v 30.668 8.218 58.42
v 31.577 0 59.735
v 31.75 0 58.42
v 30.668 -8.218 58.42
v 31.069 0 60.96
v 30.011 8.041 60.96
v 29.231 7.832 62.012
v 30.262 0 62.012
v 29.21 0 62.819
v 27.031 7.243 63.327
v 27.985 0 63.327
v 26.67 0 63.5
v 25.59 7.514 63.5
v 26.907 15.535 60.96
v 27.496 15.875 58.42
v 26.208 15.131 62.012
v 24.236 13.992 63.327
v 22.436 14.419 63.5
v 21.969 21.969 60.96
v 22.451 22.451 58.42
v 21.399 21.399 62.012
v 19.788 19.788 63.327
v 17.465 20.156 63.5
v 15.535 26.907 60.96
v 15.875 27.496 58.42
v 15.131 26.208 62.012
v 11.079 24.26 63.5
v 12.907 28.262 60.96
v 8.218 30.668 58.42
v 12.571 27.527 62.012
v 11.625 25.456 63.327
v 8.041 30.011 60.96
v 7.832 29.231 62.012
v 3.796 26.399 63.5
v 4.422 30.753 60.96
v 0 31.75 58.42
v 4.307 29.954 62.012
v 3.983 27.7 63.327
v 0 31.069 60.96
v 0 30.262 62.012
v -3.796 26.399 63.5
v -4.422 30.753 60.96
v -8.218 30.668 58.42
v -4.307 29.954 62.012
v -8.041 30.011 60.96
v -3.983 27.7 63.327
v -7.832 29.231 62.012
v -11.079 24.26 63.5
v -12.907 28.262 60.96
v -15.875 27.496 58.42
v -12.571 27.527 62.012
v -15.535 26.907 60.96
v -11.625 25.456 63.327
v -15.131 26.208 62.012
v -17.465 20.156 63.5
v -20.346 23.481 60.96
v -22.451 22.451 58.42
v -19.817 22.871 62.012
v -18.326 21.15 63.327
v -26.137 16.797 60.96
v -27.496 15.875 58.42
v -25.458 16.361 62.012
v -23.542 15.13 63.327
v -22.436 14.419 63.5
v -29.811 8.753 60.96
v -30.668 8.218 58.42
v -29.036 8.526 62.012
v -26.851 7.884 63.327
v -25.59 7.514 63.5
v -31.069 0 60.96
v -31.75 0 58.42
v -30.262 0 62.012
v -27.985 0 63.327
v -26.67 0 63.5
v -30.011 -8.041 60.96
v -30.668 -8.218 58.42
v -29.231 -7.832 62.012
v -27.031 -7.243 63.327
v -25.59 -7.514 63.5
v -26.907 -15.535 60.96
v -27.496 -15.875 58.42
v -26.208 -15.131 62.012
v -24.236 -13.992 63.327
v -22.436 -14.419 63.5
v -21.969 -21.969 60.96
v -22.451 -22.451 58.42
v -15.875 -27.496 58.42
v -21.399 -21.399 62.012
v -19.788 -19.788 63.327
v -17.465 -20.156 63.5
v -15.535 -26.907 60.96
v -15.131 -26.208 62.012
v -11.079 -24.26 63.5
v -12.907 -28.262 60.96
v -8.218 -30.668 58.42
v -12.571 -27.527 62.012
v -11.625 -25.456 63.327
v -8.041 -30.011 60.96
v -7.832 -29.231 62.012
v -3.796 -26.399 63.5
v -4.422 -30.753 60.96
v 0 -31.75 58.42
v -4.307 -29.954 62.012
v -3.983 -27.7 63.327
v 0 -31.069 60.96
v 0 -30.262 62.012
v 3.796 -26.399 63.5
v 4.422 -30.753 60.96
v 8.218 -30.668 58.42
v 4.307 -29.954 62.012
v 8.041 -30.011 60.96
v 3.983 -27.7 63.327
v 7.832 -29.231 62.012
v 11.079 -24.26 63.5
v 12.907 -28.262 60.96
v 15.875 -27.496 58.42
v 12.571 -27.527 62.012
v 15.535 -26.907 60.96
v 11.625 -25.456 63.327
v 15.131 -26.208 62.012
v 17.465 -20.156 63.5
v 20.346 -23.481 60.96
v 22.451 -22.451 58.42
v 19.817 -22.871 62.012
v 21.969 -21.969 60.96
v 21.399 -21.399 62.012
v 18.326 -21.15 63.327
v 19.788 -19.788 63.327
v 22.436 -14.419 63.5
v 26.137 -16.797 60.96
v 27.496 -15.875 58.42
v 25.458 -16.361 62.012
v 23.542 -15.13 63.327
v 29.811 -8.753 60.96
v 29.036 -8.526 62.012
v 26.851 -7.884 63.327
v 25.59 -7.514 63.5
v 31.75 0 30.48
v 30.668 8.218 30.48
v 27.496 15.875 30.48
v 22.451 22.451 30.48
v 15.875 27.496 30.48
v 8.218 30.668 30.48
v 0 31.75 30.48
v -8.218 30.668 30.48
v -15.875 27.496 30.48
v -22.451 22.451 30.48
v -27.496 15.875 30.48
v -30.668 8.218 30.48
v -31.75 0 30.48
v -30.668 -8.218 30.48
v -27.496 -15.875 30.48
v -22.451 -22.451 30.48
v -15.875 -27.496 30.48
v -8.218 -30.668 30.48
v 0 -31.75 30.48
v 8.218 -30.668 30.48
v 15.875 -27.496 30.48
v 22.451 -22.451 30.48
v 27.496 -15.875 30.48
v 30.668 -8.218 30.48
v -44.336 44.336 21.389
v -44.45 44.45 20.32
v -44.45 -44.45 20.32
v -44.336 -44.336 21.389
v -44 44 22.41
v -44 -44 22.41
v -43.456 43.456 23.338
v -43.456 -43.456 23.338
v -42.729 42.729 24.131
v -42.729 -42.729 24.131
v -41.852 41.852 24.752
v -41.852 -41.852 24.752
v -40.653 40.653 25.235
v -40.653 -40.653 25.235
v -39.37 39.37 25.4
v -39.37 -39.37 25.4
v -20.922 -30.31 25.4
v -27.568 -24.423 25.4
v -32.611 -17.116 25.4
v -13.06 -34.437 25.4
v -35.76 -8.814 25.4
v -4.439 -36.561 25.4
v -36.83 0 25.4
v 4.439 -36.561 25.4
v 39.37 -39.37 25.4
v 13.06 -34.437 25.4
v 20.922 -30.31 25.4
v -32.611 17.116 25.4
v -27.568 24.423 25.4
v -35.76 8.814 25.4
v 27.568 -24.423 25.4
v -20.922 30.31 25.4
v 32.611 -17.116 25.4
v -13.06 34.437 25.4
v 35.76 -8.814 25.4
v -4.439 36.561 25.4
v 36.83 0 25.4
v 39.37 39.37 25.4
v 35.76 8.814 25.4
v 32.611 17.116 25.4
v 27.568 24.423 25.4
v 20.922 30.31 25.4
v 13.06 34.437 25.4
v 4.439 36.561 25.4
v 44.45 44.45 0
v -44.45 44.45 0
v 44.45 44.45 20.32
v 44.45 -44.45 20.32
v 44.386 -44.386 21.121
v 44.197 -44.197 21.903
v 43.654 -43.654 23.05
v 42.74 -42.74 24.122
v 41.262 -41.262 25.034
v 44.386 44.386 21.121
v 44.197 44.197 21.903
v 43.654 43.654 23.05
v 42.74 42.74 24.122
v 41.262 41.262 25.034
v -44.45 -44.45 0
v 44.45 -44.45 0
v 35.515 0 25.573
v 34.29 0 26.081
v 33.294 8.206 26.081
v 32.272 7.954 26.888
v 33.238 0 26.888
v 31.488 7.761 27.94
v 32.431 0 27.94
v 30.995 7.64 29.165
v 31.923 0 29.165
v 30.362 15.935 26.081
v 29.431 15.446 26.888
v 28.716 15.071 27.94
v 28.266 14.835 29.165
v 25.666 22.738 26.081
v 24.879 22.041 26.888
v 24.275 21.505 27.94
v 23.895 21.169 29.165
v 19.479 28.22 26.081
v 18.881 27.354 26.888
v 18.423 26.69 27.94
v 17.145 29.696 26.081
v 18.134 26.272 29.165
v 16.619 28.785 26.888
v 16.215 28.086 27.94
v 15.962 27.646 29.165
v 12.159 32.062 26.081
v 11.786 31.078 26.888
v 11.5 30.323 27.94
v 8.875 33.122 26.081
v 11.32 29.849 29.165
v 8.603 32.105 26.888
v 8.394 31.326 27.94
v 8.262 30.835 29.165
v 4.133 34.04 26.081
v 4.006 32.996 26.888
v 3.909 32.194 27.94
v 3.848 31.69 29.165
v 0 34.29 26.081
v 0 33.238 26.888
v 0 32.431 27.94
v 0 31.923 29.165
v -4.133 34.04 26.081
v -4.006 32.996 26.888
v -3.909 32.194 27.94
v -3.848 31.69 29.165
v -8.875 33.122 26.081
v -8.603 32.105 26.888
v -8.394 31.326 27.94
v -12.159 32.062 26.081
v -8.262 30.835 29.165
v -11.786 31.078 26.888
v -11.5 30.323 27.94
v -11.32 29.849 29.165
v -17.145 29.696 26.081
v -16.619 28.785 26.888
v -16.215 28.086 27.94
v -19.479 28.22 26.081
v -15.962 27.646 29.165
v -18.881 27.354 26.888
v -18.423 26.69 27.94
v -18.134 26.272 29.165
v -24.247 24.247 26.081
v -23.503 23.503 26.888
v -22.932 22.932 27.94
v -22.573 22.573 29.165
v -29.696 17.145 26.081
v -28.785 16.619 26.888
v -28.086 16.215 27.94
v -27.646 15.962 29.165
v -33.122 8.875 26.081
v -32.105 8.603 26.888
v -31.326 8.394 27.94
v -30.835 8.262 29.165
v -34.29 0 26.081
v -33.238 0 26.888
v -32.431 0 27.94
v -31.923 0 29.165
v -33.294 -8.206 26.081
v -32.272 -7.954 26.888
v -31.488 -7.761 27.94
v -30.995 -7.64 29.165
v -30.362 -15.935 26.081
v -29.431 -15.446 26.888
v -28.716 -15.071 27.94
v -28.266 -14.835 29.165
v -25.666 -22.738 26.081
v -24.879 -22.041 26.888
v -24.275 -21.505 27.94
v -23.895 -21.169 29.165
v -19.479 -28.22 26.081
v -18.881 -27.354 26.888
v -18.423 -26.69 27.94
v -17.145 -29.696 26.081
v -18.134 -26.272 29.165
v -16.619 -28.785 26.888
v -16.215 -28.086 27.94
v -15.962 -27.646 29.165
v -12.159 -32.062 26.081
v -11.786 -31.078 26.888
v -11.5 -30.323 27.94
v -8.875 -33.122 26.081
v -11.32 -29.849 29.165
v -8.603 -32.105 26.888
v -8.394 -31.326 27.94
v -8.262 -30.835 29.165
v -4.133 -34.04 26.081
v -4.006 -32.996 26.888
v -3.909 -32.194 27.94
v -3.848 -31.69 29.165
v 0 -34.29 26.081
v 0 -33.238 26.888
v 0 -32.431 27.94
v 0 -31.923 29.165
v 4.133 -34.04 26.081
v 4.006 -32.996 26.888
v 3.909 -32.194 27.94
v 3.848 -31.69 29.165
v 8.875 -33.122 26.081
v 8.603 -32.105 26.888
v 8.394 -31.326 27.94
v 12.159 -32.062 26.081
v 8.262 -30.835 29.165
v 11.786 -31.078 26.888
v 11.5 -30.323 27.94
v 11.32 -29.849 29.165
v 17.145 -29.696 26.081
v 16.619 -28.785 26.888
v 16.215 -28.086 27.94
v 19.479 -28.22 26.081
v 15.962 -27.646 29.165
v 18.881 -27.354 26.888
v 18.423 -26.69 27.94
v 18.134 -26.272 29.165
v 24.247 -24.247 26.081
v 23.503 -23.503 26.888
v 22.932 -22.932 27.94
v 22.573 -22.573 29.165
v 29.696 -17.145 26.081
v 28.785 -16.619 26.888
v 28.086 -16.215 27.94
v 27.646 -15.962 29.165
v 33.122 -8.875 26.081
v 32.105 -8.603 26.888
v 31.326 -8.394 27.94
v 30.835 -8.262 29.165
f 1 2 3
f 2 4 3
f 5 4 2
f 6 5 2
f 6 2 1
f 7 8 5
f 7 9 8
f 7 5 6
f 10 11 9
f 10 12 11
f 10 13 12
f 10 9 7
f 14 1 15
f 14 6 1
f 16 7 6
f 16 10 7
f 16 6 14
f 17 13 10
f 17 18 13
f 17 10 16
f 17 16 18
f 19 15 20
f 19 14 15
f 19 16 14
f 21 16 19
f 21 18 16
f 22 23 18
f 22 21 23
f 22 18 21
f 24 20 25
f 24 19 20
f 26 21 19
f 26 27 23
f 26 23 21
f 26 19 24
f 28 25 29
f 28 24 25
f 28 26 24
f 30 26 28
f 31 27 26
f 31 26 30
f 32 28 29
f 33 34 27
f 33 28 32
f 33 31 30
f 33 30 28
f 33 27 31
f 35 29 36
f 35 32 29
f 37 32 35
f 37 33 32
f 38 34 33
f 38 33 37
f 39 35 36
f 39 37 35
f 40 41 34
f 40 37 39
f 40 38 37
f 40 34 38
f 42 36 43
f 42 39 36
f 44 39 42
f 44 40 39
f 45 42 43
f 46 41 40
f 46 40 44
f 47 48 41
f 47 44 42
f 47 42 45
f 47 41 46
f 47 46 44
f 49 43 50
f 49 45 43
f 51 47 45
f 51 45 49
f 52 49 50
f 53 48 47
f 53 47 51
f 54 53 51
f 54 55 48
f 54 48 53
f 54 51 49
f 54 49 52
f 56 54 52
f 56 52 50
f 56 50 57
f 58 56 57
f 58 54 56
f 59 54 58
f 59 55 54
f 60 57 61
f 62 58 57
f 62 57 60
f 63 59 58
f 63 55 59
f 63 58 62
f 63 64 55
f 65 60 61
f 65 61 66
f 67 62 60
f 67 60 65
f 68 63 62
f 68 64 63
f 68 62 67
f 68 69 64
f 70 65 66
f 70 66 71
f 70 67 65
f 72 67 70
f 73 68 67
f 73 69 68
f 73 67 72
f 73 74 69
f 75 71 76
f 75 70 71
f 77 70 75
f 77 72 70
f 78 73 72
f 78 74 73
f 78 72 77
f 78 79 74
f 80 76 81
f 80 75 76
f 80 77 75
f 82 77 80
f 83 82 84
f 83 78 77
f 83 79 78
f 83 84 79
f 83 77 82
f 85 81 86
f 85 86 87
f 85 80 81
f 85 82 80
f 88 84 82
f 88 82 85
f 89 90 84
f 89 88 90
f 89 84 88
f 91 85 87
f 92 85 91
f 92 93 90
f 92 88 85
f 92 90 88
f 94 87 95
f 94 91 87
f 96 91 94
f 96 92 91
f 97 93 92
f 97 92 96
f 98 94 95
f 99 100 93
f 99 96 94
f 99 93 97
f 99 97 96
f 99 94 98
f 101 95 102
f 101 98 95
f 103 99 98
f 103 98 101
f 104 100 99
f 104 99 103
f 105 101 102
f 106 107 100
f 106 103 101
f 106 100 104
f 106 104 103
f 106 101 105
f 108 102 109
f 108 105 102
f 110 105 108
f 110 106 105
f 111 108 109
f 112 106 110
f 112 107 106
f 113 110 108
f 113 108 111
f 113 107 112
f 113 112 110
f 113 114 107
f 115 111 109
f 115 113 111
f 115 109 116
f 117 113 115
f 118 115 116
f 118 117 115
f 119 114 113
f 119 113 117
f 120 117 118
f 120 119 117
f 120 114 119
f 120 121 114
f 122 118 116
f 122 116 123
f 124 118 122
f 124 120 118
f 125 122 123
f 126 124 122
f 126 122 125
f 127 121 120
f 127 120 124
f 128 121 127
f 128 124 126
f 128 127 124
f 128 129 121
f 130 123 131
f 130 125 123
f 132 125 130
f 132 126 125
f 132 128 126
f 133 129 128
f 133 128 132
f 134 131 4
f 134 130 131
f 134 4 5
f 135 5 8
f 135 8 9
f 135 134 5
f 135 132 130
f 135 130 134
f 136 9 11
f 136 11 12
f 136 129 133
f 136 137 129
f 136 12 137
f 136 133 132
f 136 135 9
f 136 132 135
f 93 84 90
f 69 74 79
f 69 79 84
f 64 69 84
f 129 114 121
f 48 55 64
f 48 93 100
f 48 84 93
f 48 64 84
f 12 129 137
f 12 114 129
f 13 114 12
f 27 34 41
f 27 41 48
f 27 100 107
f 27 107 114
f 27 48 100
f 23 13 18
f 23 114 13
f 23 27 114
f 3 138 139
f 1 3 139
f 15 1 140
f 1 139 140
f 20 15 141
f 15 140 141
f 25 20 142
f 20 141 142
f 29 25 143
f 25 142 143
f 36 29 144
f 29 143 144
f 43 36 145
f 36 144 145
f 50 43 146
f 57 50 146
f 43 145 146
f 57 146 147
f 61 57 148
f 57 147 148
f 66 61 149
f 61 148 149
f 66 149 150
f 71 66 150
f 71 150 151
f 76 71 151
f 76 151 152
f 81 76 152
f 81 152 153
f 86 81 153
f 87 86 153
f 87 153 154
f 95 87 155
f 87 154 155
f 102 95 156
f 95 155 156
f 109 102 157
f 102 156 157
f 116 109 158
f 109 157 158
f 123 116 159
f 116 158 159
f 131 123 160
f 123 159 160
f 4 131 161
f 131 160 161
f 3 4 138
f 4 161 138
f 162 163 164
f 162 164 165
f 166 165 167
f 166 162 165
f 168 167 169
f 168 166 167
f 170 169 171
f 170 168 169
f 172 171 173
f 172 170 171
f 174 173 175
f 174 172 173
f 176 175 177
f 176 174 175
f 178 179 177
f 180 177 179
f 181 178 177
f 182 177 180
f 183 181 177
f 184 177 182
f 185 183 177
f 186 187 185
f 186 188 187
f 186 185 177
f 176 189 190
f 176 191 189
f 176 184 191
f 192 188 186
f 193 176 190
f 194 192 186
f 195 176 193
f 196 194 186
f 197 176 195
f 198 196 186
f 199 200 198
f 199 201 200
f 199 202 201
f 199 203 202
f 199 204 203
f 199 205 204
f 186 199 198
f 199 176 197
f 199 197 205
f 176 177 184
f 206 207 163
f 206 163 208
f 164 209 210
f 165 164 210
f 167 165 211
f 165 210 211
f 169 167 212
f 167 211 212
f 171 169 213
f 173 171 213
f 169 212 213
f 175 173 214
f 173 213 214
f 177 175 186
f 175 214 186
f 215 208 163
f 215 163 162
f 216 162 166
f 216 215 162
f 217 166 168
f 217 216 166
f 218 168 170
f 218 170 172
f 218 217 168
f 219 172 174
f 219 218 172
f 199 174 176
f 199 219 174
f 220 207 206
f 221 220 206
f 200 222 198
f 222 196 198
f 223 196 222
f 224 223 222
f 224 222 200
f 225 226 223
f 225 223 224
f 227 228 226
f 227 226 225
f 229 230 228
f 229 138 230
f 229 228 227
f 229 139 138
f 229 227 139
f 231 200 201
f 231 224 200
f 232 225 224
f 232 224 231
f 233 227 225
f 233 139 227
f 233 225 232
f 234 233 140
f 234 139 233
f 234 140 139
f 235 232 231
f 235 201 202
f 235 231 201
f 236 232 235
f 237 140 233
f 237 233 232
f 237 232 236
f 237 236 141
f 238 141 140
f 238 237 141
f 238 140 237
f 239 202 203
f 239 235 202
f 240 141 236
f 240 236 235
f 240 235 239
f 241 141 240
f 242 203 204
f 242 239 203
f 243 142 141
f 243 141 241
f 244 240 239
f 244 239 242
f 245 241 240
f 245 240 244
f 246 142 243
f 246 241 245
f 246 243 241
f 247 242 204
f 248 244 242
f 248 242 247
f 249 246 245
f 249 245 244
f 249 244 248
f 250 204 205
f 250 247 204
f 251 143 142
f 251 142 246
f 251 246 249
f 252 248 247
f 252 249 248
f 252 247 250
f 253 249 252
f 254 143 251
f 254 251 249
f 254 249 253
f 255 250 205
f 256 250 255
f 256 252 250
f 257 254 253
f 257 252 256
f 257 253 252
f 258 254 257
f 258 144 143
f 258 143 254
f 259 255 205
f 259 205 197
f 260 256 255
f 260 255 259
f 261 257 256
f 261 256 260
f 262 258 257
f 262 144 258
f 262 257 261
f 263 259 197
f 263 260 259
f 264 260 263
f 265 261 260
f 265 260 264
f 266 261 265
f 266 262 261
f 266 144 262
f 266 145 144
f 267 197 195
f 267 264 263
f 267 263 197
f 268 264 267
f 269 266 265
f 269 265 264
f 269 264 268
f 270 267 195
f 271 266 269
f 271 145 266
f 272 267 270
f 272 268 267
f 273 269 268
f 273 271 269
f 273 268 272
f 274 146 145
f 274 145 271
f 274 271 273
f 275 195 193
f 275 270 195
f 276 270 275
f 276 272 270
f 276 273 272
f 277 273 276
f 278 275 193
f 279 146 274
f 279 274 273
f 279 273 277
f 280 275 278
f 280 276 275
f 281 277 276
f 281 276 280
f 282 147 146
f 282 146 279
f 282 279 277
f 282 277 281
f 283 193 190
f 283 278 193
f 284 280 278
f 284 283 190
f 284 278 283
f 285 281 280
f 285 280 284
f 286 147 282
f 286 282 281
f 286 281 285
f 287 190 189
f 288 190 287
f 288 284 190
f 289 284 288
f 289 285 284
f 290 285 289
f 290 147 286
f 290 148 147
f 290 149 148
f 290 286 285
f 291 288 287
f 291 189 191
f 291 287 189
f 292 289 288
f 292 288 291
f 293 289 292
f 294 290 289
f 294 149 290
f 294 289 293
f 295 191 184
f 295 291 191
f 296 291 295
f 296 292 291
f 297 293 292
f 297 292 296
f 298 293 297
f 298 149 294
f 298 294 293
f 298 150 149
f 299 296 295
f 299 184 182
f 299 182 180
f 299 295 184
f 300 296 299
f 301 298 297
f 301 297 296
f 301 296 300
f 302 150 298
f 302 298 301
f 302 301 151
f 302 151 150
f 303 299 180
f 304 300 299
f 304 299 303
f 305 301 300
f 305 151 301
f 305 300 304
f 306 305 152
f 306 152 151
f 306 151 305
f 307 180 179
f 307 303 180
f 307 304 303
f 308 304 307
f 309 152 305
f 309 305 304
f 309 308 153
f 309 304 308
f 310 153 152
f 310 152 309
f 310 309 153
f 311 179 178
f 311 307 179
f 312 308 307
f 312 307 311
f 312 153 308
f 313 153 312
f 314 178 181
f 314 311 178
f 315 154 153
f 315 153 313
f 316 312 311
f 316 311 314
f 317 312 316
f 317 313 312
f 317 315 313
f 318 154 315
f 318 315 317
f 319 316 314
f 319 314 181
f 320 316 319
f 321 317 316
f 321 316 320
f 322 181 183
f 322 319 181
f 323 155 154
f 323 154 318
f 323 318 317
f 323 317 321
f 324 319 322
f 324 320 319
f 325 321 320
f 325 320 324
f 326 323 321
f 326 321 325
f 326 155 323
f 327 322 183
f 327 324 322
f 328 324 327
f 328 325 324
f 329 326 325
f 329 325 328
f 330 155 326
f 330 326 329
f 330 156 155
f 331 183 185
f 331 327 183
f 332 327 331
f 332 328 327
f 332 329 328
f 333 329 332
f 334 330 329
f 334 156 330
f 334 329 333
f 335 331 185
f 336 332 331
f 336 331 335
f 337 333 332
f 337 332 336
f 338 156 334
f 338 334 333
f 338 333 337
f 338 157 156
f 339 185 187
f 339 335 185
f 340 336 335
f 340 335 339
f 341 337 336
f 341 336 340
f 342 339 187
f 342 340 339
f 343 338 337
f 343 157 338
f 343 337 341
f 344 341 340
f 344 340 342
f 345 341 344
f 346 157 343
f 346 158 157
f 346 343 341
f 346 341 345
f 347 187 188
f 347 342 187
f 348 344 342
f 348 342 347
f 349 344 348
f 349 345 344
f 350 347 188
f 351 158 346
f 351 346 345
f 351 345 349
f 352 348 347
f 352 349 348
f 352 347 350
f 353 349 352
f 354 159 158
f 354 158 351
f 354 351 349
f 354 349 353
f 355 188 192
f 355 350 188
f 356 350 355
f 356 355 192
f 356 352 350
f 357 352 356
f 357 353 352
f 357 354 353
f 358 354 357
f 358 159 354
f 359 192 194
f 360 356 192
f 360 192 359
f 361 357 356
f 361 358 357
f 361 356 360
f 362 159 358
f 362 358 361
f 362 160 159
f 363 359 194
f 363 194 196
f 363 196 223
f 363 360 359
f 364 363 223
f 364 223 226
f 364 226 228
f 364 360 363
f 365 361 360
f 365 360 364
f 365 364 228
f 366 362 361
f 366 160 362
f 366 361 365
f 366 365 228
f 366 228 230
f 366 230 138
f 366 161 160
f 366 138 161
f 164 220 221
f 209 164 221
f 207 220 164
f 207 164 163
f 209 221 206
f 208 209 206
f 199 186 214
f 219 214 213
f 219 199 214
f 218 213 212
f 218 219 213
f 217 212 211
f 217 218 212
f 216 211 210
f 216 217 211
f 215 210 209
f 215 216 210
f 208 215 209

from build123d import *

# Parameters (mm, degrees)
F0_W     = 88.9
F0_H     = 88.9
F1_DEPTH = 25.4
F2_R     = 31.75
F3_DEPTH = 38.1
F4_R     = 5.08


with BuildPart() as f1:
    # F0 (on Top) → F1 (new body)
    with BuildSketch(Plane.XY):
        Rectangle(F0_W, F0_H)
    extrude(amount=F1_DEPTH)

    # F2 (on face) → F3 (join)
    with BuildSketch(Plane.XY.offset(25.4)):
        Circle(F2_R)
    extrude(amount=F3_DEPTH)

    # F4
    f4_edges = [f1.edges().sort_by_distance(p)[0] for p in [
        (-31.75, 0, 63.5),
        (-31.75, 0, 25.4),
        (44.45, 0, 25.4),
        (0, -44.45, 25.4),
        (-44.45, 0, 25.4),
        (0, 44.45, 25.4),
    ]]
    fillet(f4_edges, radius=F4_R)


solid = f1.part
